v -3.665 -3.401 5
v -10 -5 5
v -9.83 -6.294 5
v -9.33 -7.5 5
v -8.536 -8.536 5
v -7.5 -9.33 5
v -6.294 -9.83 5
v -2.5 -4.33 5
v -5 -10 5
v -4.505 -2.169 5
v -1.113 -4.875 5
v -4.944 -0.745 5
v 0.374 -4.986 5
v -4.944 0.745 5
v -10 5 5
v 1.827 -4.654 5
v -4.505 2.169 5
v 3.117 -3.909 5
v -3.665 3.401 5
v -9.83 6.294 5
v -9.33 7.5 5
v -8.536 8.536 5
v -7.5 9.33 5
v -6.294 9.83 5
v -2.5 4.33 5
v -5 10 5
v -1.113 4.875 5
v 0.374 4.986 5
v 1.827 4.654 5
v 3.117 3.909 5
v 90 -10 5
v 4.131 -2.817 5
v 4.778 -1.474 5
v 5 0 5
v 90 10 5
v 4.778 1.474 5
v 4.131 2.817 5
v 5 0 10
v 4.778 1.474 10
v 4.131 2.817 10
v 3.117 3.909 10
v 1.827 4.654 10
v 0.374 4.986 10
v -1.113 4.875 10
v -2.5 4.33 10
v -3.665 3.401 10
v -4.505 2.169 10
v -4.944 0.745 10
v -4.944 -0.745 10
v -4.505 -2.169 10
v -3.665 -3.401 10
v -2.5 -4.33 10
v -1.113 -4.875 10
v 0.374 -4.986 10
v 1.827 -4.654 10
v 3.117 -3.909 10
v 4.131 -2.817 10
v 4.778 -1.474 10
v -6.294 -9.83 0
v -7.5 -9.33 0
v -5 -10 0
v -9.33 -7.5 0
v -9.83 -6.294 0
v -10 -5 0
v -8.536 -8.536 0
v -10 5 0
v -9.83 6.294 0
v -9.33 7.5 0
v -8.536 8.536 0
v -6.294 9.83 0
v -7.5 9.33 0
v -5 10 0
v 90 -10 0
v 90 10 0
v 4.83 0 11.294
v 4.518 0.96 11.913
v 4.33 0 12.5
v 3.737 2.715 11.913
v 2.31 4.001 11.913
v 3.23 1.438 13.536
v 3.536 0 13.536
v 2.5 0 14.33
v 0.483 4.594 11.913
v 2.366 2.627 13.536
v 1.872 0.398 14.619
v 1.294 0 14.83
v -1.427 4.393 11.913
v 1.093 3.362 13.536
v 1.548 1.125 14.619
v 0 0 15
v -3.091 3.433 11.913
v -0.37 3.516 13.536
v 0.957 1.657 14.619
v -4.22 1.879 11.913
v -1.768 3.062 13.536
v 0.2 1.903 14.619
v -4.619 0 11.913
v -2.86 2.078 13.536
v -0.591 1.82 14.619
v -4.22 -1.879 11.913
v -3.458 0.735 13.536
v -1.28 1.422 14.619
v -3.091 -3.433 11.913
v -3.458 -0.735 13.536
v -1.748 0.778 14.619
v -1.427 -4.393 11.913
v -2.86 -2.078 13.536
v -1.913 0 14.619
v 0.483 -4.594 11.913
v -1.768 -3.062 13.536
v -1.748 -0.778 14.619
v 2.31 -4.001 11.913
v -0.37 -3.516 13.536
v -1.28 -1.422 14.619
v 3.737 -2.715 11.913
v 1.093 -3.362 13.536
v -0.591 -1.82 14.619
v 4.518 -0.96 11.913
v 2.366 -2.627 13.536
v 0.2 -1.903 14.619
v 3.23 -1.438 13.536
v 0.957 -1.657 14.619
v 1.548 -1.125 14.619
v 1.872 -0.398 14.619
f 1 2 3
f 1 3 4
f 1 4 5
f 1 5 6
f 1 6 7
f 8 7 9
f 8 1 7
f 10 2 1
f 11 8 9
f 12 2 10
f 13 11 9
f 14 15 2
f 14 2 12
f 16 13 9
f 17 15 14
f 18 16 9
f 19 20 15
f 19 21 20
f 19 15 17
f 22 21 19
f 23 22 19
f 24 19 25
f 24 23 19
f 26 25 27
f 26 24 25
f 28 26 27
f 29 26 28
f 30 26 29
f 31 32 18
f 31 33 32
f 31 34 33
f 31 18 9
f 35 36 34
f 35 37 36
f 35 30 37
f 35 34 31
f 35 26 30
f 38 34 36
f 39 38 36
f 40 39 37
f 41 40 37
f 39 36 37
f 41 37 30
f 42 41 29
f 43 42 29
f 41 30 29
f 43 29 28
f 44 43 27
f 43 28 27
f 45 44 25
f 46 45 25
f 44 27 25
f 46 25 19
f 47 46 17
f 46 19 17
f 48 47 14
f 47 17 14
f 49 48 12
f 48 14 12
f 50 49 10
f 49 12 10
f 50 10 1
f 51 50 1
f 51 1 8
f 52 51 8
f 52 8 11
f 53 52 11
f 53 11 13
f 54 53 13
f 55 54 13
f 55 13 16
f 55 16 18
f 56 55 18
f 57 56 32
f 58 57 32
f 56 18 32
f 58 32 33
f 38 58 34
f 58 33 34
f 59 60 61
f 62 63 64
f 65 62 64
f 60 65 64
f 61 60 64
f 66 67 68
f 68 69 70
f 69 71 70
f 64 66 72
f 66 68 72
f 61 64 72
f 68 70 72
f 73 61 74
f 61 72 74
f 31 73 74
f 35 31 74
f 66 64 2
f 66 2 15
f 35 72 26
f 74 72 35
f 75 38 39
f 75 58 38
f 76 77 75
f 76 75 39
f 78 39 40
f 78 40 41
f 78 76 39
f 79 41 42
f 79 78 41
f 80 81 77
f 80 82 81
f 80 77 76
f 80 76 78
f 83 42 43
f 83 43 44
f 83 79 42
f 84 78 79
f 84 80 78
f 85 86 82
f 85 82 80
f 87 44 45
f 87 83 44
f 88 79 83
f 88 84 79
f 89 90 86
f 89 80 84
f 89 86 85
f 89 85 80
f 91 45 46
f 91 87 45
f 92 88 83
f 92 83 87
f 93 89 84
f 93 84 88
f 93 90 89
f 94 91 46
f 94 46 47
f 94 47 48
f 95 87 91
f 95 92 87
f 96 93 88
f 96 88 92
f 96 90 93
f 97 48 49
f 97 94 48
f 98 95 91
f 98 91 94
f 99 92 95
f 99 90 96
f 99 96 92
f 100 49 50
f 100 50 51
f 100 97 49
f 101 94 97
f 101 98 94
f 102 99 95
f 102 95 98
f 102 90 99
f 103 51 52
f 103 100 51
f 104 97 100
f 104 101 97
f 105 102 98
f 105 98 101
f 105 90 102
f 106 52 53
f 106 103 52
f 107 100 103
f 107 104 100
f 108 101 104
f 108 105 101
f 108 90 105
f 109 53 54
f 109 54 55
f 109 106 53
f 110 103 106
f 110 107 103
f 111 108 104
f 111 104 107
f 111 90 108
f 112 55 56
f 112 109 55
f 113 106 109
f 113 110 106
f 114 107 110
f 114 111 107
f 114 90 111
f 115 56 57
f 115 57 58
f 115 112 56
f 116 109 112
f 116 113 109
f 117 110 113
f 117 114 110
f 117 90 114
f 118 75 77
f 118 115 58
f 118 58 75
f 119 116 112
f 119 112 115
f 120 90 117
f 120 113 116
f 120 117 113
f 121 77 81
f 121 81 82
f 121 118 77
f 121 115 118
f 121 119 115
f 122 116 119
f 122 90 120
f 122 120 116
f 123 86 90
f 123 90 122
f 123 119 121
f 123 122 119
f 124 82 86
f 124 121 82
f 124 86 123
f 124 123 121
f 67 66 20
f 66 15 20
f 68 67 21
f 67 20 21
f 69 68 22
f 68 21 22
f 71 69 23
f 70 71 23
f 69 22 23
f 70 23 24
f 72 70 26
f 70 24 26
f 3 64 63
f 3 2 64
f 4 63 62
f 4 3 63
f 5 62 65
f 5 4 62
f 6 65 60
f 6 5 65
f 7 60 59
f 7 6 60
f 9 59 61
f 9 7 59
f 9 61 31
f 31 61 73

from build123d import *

# Parameters (mm, degrees)
F0_W     = 100
F0_H     = 20
F1_DEPTH = 5
F2_R     = 5
F3_DEPTH = 10
F4_R     = 5
F5_R     = 5


with BuildPart() as f1:
    # F0 (on Top) → F1 (new body)
    with BuildSketch(Plane.XY):
        with Locations((40, 0)):
            Rectangle(F0_W, F0_H)
    extrude(amount=F1_DEPTH)

    # F2 (on face) → F3 (join)
    with BuildSketch(Plane.XY.offset(5)):
        Circle(F2_R)
    extrude(amount=F3_DEPTH)

    # F4
    f4_edges = [f1.edges().sort_by_distance(p)[0] for p in [
        (-10, -10, 2.5),
        (-10, 10, 2.5),
    ]]
    fillet(f4_edges, radius=F4_R)

    # F5
    f5_edges = [f1.edges().sort_by_distance(p)[0] for p in [
        (-5, 0, 15),
    ]]
    fillet(f5_edges, radius=F5_R)


solid = f1.part
